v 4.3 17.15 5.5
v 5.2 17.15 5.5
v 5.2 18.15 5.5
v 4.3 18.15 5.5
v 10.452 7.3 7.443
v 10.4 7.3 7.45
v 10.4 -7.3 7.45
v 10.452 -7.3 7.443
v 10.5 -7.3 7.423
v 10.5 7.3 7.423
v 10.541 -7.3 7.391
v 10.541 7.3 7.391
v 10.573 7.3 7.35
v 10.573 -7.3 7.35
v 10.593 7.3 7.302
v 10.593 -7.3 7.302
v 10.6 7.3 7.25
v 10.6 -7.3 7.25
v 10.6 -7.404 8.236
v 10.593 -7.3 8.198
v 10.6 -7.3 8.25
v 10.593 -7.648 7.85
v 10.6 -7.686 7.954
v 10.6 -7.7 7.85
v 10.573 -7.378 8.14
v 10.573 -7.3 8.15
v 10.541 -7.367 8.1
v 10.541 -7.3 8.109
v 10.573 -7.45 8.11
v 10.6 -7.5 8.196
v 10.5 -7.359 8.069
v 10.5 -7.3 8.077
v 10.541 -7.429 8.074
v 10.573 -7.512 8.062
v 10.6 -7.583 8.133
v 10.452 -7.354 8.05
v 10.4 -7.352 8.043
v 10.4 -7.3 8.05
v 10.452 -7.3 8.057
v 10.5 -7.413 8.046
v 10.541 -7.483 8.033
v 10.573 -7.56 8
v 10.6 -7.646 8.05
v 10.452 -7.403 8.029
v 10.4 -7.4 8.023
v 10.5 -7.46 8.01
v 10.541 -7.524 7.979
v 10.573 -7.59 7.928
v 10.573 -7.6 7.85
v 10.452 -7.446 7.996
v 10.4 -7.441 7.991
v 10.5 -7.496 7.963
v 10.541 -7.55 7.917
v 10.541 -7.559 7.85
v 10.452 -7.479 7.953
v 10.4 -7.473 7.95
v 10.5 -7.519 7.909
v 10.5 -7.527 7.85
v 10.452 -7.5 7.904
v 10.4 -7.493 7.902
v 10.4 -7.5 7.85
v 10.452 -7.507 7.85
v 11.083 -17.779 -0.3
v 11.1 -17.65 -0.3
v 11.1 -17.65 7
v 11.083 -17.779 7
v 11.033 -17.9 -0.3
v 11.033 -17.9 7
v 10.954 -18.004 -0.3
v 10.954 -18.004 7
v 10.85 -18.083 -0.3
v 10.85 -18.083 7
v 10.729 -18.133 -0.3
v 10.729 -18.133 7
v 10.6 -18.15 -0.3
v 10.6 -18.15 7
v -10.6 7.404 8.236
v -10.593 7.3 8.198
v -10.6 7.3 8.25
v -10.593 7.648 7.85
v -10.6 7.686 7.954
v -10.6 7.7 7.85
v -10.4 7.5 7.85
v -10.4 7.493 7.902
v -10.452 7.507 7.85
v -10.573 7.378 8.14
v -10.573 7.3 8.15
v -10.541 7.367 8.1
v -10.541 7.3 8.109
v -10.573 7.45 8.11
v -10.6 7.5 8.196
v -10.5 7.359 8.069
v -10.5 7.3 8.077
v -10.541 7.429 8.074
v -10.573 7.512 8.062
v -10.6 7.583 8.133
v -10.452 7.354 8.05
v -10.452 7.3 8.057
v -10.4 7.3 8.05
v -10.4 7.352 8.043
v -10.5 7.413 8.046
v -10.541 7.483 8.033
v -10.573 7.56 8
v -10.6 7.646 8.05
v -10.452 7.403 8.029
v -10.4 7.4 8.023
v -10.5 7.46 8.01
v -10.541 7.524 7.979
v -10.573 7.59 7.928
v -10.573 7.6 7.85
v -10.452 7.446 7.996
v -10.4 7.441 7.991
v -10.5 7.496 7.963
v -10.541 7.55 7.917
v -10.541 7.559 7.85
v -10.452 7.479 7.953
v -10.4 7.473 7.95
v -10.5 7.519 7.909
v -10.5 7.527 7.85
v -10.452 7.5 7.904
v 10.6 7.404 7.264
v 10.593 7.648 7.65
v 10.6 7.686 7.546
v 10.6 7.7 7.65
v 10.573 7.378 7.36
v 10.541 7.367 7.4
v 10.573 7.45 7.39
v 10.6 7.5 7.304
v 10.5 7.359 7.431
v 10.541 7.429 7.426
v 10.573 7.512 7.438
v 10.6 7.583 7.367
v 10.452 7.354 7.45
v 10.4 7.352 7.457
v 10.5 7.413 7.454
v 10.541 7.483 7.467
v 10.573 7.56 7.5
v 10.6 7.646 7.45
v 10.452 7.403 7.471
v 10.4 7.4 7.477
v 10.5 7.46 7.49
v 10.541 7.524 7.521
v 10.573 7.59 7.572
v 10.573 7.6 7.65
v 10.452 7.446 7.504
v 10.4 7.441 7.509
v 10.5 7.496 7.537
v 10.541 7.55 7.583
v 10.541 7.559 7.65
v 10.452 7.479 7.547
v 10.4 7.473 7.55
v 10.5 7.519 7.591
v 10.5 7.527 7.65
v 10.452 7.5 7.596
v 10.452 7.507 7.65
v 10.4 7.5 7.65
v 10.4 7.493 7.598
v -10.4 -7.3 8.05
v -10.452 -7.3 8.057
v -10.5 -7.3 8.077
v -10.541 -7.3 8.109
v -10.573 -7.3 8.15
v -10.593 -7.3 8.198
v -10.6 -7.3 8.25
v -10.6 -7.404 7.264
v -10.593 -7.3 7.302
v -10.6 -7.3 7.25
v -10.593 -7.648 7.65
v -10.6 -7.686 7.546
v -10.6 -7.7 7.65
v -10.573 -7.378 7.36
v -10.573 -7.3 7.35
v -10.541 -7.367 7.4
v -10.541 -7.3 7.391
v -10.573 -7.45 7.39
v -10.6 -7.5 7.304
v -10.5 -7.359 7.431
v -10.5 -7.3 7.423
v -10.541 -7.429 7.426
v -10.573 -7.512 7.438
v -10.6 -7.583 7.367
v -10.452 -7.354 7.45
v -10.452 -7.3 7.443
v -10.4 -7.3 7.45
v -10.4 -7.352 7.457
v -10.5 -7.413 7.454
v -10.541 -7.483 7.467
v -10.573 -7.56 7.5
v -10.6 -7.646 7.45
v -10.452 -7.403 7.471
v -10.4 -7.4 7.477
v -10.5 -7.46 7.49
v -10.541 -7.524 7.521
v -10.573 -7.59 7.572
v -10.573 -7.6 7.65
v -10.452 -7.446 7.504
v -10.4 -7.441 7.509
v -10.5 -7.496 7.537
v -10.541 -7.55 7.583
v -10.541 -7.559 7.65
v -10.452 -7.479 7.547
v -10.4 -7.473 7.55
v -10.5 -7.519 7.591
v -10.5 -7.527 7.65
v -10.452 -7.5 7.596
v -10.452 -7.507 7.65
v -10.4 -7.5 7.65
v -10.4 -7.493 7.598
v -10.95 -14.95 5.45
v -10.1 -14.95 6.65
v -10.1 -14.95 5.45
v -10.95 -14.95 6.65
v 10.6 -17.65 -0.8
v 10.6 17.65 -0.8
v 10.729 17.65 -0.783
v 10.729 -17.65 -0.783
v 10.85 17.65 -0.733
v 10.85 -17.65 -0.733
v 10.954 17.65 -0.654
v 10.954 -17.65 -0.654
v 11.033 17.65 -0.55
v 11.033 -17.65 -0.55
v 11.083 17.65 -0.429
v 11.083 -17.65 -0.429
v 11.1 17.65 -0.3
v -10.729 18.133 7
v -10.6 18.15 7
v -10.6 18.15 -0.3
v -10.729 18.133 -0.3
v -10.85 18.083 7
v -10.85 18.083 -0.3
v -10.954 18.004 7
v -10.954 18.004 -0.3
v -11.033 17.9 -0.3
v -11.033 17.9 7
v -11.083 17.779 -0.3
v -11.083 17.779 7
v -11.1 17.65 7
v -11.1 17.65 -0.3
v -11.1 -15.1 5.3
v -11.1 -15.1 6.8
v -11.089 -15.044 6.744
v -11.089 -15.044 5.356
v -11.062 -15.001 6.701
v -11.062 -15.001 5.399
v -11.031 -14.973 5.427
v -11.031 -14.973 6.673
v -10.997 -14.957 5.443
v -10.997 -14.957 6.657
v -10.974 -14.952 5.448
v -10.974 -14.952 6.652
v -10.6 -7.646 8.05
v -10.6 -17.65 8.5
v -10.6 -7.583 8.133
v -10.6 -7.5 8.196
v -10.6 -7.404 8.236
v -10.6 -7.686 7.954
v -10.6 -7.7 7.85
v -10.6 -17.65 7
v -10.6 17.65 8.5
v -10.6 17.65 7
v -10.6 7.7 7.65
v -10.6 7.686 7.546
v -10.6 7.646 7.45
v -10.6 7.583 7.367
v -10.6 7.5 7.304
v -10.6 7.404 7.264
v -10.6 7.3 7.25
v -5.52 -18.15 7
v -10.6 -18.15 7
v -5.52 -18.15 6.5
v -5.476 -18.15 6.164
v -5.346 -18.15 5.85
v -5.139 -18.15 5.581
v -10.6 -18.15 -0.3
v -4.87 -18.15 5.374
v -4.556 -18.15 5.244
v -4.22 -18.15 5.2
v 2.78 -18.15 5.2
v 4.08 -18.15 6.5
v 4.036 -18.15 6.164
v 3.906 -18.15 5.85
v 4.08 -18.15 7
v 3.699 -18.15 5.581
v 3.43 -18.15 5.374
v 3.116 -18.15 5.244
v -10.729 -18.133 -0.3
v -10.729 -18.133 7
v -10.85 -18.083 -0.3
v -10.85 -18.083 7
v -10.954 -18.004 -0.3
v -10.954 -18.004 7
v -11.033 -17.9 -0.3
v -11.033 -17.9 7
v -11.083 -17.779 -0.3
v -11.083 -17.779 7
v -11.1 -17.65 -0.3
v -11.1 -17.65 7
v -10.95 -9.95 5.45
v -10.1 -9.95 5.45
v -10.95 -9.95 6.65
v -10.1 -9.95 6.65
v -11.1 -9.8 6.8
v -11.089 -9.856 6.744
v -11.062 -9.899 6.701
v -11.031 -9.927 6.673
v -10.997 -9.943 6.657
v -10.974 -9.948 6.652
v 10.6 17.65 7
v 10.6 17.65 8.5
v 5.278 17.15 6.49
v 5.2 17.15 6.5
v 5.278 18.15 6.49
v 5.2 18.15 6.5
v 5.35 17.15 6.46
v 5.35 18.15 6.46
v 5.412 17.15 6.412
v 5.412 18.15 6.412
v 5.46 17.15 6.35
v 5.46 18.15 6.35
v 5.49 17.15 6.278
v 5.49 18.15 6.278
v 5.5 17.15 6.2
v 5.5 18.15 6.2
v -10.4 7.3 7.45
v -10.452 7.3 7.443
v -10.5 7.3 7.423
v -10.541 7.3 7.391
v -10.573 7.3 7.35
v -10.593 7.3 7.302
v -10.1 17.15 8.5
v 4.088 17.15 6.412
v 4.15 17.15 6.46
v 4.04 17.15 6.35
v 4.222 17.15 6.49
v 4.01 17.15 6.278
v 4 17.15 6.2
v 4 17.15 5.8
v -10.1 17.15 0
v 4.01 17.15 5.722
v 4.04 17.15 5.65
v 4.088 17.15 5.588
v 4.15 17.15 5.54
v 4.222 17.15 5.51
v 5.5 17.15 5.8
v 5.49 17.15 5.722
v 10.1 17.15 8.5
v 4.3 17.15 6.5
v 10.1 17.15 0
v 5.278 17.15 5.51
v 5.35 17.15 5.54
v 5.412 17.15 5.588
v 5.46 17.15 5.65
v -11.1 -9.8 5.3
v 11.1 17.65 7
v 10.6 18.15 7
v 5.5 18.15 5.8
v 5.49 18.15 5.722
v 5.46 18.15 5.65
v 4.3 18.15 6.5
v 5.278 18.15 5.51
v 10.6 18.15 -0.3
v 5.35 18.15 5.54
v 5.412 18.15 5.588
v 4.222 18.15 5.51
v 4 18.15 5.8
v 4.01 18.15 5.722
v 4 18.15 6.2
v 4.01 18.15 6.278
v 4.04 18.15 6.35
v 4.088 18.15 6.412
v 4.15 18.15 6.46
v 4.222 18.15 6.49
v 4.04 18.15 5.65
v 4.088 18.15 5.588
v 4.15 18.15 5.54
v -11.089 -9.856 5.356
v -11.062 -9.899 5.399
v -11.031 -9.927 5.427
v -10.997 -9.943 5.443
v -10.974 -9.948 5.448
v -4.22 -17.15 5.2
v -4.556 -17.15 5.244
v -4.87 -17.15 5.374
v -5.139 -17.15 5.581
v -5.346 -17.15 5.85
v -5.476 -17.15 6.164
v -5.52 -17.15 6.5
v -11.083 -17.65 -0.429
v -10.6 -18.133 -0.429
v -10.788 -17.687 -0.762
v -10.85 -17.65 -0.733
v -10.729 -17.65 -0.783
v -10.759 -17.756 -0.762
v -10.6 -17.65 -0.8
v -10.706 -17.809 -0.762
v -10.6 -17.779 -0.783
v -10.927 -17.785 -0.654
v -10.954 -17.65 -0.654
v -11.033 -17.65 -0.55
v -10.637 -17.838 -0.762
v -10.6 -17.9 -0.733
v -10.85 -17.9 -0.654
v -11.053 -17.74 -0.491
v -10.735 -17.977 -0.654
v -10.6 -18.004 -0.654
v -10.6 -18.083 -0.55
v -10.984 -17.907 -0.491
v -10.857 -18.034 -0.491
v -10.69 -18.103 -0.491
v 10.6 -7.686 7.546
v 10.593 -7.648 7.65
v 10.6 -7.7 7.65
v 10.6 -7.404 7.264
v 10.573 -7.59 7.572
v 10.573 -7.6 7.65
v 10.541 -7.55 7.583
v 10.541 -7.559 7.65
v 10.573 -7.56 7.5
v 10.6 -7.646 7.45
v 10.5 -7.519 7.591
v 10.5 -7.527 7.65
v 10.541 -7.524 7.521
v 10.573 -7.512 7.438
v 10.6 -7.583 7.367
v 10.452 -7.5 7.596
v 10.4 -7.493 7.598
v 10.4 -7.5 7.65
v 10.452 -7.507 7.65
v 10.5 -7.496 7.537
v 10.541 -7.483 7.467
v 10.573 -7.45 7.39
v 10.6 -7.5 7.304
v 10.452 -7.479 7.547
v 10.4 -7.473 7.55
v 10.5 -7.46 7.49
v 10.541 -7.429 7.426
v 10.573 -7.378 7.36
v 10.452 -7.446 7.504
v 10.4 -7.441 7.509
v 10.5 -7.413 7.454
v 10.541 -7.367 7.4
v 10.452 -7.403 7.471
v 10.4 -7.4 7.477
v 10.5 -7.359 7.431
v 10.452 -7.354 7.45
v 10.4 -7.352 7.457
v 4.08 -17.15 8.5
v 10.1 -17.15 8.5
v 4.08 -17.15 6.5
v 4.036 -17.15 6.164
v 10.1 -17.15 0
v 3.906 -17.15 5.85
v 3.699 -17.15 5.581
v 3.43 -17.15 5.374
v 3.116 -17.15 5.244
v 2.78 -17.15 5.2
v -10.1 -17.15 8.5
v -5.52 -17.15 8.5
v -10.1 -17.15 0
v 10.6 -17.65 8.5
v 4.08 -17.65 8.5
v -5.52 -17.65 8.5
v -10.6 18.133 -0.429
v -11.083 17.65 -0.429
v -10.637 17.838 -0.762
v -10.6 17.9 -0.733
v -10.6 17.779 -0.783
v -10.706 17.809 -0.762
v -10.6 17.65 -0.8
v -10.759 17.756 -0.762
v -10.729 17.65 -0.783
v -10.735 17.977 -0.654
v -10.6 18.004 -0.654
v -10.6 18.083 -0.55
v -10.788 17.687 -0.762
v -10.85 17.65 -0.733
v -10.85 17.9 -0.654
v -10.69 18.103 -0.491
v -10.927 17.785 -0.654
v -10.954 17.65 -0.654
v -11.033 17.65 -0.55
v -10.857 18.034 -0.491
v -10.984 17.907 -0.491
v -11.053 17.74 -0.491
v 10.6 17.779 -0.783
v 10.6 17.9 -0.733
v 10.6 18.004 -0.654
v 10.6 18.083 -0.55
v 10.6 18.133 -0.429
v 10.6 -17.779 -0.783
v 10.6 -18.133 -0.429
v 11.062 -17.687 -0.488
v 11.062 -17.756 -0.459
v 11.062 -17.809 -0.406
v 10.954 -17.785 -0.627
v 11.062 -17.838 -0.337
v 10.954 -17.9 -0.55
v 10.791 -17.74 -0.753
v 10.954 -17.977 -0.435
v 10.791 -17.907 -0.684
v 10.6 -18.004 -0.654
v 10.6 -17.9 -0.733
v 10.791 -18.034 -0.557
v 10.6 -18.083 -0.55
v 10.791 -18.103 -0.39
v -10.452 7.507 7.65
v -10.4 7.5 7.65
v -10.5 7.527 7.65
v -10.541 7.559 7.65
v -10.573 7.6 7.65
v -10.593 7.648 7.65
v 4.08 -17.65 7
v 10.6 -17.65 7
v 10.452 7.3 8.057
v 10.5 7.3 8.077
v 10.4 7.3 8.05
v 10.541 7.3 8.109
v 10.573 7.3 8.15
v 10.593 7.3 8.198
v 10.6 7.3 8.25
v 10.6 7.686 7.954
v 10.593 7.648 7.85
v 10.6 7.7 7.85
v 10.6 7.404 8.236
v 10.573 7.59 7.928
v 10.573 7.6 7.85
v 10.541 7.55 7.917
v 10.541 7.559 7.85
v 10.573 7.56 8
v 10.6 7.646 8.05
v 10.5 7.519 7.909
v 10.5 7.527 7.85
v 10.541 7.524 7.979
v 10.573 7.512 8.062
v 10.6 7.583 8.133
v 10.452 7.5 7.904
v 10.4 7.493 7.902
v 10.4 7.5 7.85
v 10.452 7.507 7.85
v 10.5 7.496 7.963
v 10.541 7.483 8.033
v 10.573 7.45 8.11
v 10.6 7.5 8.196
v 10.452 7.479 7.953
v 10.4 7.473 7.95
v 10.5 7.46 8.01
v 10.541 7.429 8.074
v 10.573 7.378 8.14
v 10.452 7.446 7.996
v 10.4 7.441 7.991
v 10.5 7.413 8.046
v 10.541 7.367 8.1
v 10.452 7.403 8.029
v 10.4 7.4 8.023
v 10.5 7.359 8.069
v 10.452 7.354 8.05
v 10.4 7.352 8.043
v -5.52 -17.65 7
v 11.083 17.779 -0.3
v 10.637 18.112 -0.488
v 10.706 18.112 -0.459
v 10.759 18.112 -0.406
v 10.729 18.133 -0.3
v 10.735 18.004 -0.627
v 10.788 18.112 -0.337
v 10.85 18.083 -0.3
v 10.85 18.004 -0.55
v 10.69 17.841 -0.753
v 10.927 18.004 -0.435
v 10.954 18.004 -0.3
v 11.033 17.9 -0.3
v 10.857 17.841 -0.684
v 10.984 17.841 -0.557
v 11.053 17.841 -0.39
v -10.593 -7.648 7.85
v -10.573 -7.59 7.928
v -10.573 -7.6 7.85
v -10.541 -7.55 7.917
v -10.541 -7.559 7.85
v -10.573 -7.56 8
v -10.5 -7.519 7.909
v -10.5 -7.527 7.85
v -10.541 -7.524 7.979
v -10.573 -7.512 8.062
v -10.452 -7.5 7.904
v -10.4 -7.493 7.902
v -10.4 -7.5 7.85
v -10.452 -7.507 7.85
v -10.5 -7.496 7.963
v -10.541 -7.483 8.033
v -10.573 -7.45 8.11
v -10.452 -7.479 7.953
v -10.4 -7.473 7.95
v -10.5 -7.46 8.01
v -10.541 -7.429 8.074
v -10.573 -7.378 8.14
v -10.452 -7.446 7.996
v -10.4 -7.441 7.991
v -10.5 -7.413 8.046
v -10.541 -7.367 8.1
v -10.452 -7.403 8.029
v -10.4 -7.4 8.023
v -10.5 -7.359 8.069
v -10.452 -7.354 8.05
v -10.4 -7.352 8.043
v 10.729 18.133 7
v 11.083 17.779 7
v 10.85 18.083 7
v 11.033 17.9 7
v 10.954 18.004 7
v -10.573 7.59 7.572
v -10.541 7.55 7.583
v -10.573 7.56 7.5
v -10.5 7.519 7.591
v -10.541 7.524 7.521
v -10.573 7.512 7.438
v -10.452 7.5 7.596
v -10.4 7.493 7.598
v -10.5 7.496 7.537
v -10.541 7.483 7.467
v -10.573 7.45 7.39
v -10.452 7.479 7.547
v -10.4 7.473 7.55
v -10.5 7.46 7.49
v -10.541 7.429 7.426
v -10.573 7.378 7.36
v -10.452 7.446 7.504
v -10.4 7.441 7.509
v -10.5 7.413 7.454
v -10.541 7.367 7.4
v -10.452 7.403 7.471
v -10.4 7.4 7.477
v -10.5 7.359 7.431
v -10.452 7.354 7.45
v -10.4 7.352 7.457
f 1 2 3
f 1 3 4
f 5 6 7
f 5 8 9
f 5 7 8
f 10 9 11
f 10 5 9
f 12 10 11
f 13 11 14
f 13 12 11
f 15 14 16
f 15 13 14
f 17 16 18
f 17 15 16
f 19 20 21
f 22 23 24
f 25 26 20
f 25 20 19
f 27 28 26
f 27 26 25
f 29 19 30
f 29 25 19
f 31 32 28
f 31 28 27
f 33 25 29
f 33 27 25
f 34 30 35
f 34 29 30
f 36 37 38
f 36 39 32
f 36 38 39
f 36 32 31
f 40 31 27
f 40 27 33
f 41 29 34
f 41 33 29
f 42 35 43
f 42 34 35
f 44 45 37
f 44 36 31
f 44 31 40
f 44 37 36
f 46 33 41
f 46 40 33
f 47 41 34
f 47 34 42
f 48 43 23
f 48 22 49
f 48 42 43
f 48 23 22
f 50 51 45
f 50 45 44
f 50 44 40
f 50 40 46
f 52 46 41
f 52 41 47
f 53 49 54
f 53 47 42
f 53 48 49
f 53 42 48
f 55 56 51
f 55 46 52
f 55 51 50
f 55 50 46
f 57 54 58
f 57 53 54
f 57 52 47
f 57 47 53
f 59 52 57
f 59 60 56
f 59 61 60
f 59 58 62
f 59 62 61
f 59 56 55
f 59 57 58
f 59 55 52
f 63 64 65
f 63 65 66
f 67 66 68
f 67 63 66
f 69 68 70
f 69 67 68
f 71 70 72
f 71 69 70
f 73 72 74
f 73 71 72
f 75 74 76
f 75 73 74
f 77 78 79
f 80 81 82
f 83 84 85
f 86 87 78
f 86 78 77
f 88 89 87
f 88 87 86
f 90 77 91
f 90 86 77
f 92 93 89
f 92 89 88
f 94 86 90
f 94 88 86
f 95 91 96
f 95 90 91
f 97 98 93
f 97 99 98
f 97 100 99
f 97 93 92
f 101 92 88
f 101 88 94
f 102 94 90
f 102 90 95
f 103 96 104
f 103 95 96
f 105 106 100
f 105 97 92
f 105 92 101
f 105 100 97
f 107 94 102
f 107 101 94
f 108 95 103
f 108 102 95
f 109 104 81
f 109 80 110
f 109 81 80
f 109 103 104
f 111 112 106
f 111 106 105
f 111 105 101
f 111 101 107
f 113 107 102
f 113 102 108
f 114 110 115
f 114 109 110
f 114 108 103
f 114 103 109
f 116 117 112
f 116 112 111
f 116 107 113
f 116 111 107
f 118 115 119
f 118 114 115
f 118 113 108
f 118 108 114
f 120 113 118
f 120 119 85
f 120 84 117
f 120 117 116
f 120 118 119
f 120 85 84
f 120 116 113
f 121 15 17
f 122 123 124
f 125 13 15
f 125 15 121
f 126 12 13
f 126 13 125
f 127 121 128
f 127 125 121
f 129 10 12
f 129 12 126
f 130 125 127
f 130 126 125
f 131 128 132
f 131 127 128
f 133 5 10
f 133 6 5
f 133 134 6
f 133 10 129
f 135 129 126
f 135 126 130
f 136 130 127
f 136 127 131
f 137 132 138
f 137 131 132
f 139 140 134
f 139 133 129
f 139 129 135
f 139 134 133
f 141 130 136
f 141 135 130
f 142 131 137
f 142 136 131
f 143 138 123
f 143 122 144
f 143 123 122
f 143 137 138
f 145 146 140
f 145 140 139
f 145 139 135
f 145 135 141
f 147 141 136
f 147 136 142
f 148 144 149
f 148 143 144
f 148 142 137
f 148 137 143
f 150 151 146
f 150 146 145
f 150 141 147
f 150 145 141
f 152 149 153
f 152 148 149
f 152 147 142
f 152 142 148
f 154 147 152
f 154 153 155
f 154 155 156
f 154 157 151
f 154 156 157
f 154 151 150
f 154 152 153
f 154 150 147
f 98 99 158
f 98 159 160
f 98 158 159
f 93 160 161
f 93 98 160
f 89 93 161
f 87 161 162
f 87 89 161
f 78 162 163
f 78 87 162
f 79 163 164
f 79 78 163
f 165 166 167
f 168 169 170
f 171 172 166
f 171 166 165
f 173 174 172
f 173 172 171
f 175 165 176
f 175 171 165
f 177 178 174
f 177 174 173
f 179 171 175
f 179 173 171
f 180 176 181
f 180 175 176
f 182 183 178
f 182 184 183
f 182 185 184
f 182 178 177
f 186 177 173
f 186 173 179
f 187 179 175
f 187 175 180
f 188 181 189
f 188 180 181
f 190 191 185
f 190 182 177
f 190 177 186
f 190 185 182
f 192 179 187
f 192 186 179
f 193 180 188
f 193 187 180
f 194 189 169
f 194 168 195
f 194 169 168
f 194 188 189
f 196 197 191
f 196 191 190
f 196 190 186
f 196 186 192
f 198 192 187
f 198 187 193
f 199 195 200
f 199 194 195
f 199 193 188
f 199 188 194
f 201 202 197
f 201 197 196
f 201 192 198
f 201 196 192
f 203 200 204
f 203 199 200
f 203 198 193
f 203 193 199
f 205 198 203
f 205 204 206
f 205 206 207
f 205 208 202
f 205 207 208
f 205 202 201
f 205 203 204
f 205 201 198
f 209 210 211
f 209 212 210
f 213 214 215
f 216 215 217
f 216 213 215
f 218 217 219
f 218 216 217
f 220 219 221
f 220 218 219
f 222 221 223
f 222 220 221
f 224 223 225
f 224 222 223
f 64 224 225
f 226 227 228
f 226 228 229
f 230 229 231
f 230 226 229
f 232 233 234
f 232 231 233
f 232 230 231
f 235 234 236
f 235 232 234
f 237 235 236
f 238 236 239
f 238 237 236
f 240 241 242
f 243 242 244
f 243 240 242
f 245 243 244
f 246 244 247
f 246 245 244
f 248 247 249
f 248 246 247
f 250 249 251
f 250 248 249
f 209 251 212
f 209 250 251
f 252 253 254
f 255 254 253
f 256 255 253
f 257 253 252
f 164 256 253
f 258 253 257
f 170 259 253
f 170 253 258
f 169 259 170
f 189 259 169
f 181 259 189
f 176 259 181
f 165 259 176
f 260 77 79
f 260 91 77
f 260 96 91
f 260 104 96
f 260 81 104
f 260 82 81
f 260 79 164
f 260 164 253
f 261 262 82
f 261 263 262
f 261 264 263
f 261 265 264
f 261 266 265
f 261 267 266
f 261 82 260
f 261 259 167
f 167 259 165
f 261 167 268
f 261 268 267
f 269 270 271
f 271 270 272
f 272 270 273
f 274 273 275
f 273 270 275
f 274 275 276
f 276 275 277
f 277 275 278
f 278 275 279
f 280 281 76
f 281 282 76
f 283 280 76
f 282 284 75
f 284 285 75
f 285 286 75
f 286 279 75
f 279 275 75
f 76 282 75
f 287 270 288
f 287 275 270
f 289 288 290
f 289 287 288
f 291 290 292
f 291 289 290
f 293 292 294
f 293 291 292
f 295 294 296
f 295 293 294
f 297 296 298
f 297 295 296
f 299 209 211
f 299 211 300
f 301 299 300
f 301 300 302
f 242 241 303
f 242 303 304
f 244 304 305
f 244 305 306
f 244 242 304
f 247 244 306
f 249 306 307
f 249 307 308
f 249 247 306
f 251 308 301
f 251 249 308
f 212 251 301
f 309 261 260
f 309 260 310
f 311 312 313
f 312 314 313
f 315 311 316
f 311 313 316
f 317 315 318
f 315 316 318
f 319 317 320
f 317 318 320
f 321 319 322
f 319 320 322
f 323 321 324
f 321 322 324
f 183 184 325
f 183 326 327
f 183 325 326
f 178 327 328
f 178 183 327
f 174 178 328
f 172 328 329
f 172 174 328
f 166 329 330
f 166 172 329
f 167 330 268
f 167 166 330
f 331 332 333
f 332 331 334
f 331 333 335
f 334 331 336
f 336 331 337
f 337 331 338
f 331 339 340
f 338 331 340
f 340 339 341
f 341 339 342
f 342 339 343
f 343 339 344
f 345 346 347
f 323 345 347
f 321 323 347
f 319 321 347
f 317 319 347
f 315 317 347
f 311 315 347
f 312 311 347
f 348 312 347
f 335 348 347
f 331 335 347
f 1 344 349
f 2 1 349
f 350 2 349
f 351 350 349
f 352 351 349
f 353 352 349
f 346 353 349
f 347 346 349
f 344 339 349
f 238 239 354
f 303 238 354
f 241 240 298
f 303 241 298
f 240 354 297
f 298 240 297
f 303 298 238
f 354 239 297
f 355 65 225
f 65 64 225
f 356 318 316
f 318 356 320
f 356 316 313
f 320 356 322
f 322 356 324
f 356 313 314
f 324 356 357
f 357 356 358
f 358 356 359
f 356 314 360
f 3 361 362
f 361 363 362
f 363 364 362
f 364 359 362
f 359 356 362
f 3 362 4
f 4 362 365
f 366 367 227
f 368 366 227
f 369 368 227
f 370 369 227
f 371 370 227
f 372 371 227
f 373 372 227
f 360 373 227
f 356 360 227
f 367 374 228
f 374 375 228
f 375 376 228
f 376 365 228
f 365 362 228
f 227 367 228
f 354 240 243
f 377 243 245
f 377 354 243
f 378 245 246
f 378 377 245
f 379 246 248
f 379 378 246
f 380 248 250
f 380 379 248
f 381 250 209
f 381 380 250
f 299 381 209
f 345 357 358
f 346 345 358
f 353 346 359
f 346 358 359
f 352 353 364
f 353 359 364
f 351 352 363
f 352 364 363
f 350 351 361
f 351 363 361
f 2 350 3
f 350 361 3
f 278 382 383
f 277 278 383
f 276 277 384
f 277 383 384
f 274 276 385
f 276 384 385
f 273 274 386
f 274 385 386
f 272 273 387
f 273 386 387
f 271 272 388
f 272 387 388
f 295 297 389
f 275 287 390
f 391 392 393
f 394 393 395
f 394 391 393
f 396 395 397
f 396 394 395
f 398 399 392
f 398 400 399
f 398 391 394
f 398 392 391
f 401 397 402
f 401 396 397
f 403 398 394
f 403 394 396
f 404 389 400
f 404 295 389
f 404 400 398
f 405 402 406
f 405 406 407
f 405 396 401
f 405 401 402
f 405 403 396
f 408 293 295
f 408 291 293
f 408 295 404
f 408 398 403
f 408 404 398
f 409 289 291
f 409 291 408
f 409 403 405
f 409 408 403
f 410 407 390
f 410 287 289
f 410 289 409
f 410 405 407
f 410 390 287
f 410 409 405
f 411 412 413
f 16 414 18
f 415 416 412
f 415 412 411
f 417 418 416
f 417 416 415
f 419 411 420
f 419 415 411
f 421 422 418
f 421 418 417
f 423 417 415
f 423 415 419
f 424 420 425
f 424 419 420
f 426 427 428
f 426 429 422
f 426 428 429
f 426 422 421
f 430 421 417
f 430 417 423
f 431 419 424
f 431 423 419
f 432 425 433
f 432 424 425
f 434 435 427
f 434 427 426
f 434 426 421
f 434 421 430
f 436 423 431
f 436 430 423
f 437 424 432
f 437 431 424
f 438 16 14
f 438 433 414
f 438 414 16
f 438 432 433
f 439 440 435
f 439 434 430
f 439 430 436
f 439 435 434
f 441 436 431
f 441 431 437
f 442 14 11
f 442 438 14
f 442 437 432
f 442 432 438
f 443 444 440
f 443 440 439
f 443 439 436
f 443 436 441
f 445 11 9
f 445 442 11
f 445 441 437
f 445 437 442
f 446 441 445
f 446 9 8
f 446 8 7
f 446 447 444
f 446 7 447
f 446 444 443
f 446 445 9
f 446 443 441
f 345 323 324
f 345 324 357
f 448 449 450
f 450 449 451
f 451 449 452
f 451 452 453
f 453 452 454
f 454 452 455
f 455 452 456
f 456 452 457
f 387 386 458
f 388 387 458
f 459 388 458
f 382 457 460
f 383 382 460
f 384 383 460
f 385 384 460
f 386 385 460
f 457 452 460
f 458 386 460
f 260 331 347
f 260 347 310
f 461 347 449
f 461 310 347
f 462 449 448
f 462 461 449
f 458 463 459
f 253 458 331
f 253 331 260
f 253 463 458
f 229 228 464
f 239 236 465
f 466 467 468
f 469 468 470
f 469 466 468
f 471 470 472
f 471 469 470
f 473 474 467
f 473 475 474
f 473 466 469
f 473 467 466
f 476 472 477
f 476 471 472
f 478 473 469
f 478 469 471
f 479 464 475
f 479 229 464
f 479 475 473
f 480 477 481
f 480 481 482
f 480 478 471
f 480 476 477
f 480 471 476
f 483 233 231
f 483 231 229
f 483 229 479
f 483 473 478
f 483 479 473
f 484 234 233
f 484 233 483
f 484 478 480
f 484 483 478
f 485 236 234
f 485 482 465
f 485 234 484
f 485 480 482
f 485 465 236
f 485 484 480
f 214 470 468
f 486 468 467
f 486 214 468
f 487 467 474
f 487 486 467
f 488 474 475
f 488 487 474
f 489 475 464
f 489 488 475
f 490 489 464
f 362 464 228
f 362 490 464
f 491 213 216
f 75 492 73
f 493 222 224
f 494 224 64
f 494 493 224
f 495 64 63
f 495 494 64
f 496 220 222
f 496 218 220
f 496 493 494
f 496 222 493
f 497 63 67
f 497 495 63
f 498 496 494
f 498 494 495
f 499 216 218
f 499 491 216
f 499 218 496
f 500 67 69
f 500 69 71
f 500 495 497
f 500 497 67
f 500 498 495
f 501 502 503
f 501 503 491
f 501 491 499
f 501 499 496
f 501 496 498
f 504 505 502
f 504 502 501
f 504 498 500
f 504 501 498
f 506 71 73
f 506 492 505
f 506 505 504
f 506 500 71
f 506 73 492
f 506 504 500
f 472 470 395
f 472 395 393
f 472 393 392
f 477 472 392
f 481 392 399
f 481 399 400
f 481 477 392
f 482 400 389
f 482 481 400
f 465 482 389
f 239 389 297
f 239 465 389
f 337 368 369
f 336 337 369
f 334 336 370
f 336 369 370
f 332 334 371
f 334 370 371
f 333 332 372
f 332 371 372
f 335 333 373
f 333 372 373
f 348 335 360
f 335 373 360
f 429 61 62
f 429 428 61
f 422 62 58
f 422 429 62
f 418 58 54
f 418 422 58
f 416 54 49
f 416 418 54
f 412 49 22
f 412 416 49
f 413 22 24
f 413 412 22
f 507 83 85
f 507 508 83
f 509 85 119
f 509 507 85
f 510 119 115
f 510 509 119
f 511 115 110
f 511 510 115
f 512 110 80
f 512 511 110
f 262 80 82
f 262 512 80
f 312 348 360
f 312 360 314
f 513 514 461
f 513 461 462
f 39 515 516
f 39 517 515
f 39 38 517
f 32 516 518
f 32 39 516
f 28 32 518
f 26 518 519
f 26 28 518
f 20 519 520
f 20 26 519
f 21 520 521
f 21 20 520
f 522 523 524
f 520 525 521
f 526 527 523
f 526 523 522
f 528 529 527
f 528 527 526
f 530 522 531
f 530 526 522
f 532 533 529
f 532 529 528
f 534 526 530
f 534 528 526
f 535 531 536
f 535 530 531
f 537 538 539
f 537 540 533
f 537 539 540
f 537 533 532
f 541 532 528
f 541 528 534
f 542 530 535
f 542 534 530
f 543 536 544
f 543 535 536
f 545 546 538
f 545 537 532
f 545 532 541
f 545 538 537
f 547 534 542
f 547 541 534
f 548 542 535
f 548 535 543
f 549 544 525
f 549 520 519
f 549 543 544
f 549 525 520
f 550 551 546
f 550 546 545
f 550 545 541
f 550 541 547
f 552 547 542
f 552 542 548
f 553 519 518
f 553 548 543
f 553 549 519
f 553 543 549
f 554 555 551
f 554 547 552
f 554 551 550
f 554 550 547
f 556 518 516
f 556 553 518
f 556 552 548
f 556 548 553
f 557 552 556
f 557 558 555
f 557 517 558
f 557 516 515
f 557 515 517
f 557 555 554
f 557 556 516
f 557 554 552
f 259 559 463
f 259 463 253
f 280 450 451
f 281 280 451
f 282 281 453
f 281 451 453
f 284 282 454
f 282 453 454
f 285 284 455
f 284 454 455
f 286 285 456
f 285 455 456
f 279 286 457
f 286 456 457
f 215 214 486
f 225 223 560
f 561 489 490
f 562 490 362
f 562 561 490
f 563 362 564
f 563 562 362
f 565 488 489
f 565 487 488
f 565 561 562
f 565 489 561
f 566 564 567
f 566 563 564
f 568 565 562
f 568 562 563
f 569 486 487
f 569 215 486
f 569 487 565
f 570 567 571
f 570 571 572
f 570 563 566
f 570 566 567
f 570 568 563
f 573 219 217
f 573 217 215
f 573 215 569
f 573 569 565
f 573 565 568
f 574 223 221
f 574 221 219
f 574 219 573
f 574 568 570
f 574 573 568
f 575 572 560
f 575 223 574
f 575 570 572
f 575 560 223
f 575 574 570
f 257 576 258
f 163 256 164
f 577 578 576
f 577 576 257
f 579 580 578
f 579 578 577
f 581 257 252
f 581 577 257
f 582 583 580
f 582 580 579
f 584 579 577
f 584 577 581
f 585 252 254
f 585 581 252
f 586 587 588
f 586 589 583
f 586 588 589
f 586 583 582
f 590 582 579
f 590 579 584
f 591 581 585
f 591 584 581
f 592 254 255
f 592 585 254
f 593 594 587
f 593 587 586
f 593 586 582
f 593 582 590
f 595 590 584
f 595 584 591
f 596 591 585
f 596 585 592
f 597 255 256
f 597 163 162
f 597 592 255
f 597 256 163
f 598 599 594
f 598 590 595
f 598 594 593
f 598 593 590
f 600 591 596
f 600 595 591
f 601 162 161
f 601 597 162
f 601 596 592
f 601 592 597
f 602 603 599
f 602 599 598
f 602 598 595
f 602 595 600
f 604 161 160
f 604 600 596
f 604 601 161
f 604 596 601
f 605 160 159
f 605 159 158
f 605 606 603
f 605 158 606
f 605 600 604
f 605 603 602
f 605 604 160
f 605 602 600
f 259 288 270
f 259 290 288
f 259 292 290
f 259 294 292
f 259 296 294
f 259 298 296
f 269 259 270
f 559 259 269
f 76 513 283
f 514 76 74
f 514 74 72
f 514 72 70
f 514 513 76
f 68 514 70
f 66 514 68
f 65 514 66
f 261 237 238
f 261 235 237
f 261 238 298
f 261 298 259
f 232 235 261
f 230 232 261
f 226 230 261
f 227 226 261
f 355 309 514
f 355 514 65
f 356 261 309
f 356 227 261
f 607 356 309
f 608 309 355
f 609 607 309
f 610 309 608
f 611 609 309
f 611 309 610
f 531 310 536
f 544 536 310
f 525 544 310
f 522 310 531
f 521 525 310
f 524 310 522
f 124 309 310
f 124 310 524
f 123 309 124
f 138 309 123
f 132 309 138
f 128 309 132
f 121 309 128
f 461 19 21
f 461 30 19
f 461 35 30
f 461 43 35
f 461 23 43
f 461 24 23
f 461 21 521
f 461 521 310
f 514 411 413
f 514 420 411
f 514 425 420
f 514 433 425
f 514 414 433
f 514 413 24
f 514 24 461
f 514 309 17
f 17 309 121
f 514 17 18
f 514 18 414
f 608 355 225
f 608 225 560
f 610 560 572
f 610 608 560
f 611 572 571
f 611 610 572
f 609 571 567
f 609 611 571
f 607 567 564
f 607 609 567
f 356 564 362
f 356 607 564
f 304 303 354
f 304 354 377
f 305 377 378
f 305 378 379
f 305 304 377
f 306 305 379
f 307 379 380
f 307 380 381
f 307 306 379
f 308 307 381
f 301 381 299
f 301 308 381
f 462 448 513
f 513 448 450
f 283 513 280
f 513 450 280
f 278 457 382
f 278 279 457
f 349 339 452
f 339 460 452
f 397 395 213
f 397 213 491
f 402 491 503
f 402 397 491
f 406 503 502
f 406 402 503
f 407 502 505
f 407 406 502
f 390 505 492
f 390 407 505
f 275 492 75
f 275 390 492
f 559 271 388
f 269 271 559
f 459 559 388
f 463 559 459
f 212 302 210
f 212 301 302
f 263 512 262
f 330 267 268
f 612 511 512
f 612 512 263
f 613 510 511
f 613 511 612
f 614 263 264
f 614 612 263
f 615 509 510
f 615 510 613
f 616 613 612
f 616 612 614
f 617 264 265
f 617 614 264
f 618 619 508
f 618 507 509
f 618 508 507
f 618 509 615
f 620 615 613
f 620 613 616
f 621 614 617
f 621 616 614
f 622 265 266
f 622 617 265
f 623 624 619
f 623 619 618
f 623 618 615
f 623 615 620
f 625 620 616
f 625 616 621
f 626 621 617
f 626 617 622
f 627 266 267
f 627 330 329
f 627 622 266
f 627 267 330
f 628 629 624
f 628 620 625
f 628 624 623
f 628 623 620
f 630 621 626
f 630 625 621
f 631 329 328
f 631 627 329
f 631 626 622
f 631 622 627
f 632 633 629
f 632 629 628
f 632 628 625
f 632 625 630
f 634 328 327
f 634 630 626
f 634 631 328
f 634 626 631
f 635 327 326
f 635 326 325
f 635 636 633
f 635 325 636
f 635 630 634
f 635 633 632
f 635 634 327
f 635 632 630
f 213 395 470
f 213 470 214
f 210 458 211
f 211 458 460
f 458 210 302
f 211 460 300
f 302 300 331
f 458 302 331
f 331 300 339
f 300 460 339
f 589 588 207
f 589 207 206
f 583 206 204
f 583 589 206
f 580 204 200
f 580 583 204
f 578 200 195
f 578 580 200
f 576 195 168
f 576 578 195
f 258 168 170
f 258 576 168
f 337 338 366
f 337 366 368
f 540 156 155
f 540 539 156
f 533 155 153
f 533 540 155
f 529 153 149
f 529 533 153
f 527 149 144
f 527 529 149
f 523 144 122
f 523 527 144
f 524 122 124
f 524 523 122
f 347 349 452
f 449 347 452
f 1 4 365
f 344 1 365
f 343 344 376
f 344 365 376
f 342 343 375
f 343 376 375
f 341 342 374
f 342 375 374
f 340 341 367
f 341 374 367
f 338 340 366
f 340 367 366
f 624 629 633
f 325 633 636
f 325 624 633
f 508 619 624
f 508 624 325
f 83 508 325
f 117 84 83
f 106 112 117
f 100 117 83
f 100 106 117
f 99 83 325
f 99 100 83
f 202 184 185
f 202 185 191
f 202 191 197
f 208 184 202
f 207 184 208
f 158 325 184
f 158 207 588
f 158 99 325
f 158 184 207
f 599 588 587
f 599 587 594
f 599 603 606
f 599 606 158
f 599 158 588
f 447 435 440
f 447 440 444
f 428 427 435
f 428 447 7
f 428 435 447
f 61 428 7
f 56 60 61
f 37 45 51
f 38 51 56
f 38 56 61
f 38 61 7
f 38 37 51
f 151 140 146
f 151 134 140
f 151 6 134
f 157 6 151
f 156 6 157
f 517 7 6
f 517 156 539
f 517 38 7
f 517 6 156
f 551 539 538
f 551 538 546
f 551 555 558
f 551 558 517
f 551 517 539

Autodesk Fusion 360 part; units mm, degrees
sketch "Sketch1" plane through (0, 0, 0) normal (0, 0, 1) x (1, 0, 0)
  line L0 (10.1, -17.15) -> (-10.1, -17.15)
  line L1 (-10.1, -17.15) -> (-10.1, 17.15)
  line L2 (-10.1, 17.15) -> (10.1, 17.15)
  line L3 (10.1, 17.15) -> (10.1, -17.15)
  line L4 (10.1, -17.15) -> (-10.1, 17.15) construction
  line L5 (-10.1, -17.15) -> (10.1, 17.15) construction
  line L6 (11.1, 18.15) -> (-11.1, 18.15)
  line L7 (-11.1, 18.15) -> (-11.1, -18.15)
  line L8 (-11.1, -18.15) -> (11.1, -18.15)
  line L9 (11.1, -18.15) -> (11.1, 18.15)
  line L10 (11.1, 18.15) -> (-11.1, -18.15) construction
  line L11 (-11.1, 18.15) -> (11.1, -18.15) construction
  dimension "d1" = 20.2
  dimension "d2" = 34.3
  dimension "d4" = 1
  dimension "d5" = 1
extrude "Extrude1" add sketch "Sketch1" along normal blind 7
sketch "Sketch2" plane through (0, 0, 0) normal (0, 0, -1) x (1, 0, 0)
  line L0 (10.1, -17.15) -> (-10.1, -17.15)
  line L1 (-10.1, -17.15) -> (-10.1, 17.15)
  line L2 (-10.1, 17.15) -> (10.1, 17.15)
  line L3 (10.1, 17.15) -> (10.1, -17.15)
  line L4 (11.1, -18.15) -> (11.1, 18.15)
  line L5 (11.1, 18.15) -> (-11.1, 18.15)
  line L6 (-11.1, 18.15) -> (-11.1, -18.15)
  line L7 (-11.1, -18.15) -> (11.1, -18.15)
  line L8 (-11.1, 18.15) -> (11.1, 18.15)
  line L9 (11.1, 18.15) -> (11.1, -18.15)
  line L10 (11.1, -18.15) -> (-11.1, -18.15)
  line L11 (-11.1, -18.15) -> (-11.1, 18.15)
extrude "Extrude2" add sketch "Sketch2" along normal blind 0.8 contours L0 L1 L2 L3 | L4 L5 L6 L7 L8 L9 L10 L11
sketch "Sketch3" plane through (0, -18.15, 0) normal (0, -1, 0) x (1, 0, 0)
  line L0 (11.1, -0.8) -> (11.1, 7)
  line L1 (11.1, 7) -> (-11.1, 7)
  line L2 (-11.1, 7) -> (-11.1, -0.8)
  line L3 (-11.1, -0.8) -> (11.1, -0.8)
  line L4 (-5.52, 7) -> (4.08, 7)
  line L5 (4.08, 7) -> (4.08, 5.2)
  line L6 (4.08, 5.2) -> (-5.52, 5.2)
  line L7 (-5.52, 5.2) -> (-5.52, 7)
  dimension "d10" = 6
  dimension "d11" = 5.58
  dimension "d14" = 9.6
extrude "Extrude3" cut sketch "Sketch3" against normal up to surface (1 mm away) contours L1 L4 L5 L6 L7
fillet "Fillet1" radius 1.3 2 edges at (-5.52, -17.65, 5.2) (4.08, -17.65, 5.2)
sketch "Sketch4" plane through (-11.1, 0, 0) normal (-1, 0, 0) x (0, -1, 0)
  line L0 (18.15, -0.8) -> (18.15, 7)
  line L1 (18.15, 7) -> (-18.15, 7)
  line L2 (-18.15, 7) -> (-18.15, -0.8)
  line L3 (-18.15, -0.8) -> (18.15, -0.8)
  line L4 (9.95, 6.65) -> (14.95, 6.65)
  line L5 (14.95, 6.65) -> (14.95, 5.45)
  line L6 (14.95, 5.45) -> (9.95, 5.45)
  line L7 (9.95, 5.45) -> (9.95, 6.65)
  dimension "d17" = 3.2
  dimension "d18" = 5
  dimension "d19" = 1.2
  dimension "d22" = 0.35
extrude "Extrude4" cut sketch "Sketch4" against normal up to surface (1 mm away) contours L4 L5 L6 L7
fillet "Fillet2" radius 0.15 4 edges at (-11.1, -12.45, 5.45) (-11.1, -9.95, 6.05) (-11.1, -12.45, 6.65) (-11.1, -14.95, 6.05)
sketch "Sketch5" plane through (0, 0, 7) normal (0, 0, 1) x (-1, 0, 0)
  line L0 (-4.08, 17.15) -> (-4.08, 18.15)
  line L1 (-4.08, 18.15) -> (-11.1, 18.15)
  line L2 (-11.1, 18.15) -> (-11.1, -18.15)
  line L3 (-11.1, -18.15) -> (11.1, -18.15)
  line L4 (11.1, -18.15) -> (11.1, 18.15)
  line L5 (11.1, 18.15) -> (5.52, 18.15)
  line L6 (5.52, 18.15) -> (5.52, 17.15)
  line L7 (5.52, 17.15) -> (10.1, 17.15)
  line L8 (10.1, 17.15) -> (10.1, -17.15)
  line L9 (10.1, -17.15) -> (-10.1, -17.15)
  line L10 (-10.1, -17.15) -> (-10.1, 17.15)
  line L11 (-10.1, 17.15) -> (-4.08, 17.15)
  line L12 (10.6, -17.65) -> (-10.6, -17.65)
  line L13 (-10.6, -17.65) -> (-10.6, 17.65)
  line L14 (-10.6, 17.65) -> (10.6, 17.65)
  line L15 (10.6, 17.65) -> (10.6, -17.65)
  dimension "d26" = 0.5
  dimension "d27" = 0.5
  dimension "d28" = 0.5
  dimension "d29" = 0.5
extrude "Extrude5" add sketch "Sketch5" along normal blind 1.5 contours L0 L6 L7 L8 L9 L10 L11 L12 L13 L14 L15
sketch "Sketch7" plane through (10.6, 0, 0) normal (1, 0, 0) x (0, 1, 0)
  line L0 (-17.65, 7) -> (17.65, 7)
  line L1 (17.65, 7) -> (17.65, 8.5)
  line L2 (17.65, 8.5) -> (-17.65, 8.5)
  line L3 (-17.65, 8.5) -> (-17.65, 7)
  line L4 (-17.65, 8.5) -> (17.65, 7) construction
  line L5 (17.65, 8.5) -> (-17.65, 7) construction
  line L6 (0, 7.75) -> (-14.5, 7.75) construction
  line L7 (7.5, 7.45) -> (-7.5, 7.45)
  line L8 (-7.5, 7.45) -> (-7.5, 8.05)
  line L9 (-7.5, 8.05) -> (7.5, 8.05)
  line L10 (7.5, 8.05) -> (7.5, 7.45)
  line L11 (7.5, 7.45) -> (-7.5, 8.05) construction
  line L12 (-7.5, 7.45) -> (7.5, 8.05) construction
  point P0 (0, 7.75)
  dimension "d32" = 15
  dimension "d33" = 0.6
ref_plane "WorkPlane1" through (0, 0, 7.75) normal (1, 0, 0) x (0, 1, 0)
extrude "Extrude6" cut sketch "Sketch7" against normal blind 0.2 contours L7 L8 L9 L10
fillet "Fillet5" radius 0.2 4 edges at (10.5, -7.5, 7.45) (10.5, -7.5, 8.05) (10.5, 7.5, 7.45) (10.5, 7.5, 8.05)
fillet "Fillet6" radius 0.2 8 edges at (10.6, -7.4414, 7.5086) (10.6, 0, 7.45) (10.6, 7.4414, 7.5086) (10.6, 7.5, 7.75) (10.6, 7.4414, 7.9914) (10.6, 0, 8.05) (10.6, -7.4414, 7.9914) (10.6, -7.5, 7.75)
mirror "Mirror2" about plane through (0, 0, 7.75) normal (1, 0, 0) of "Extrude6"
fillet "Fillet7" radius 0.2 4 edges at (-10.5, 7.5, 7.45) (-10.5, 7.5, 8.05) (-10.5, -7.5, 7.45) (-10.5, -7.5, 8.05)
fillet "Fillet8" radius 0.2 8 edges at (-10.6, -7.4414, 7.9914) (-10.6, -7.5, 7.75) (-10.6, -7.4414, 7.5086) (-10.6, 0, 7.45) (-10.6, 7.4414, 7.5086) (-10.6, 7.5, 7.75) (-10.6, 7.4414, 7.9914) (-10.6, 0, 8.05)
fillet "Fillet9" radius 0.5 8 edges at (-11.1, 18.15, 3.1) (-11.1, -18.15, 3.1) (-11.1, 0, -0.8) (0, -18.15, -0.8) (11.1, -18.15, 3.1) (11.1, 0, -0.8) (11.1, 18.15, 3.1) (0, 18.15, -0.8)
sketch "Sketch8" plane through (0, 17.15, 0) normal (0, -1, 0) x (1, 0, 0)
  line L0 (-10.1, 0) -> (10.1, 0)
  line L1 (10.1, 0) -> (10.1, 8.5)
  line L2 (10.1, 8.5) -> (-10.1, 8.5)
  line L3 (-10.1, 8.5) -> (-10.1, 0)
  line L4 (4, 6.5) -> (5.5, 6.5)
  line L5 (5.5, 6.5) -> (5.5, 5.5)
  line L6 (5.5, 5.5) -> (4, 5.5)
  line L7 (4, 5.5) -> (4, 6.5)
  dimension "d55" = 4.6
  dimension "d56" = 2
  dimension "d57" = 1.5
  dimension "d58" = 1
extrude "Extrude7" cut sketch "Sketch8" against normal up to surface (1 mm away) contours L4 L5 L6 L7
fillet "Fillet10" radius 0.3 4 edges at (5.5, 17.65, 5.5) (5.5, 17.65, 6.5) (4, 17.65, 6.5) (4, 17.65, 5.5)
equation "case_thickness = 1 mm"
equation "d4 = case_thickness"
equation "d5 = case_thickness"
equation "d8 = case_bottom - 0.2 mm"
equation "d11 = 4.58 mm + case_thickness"
equation "lock_rim = 0.5 mm"
equation "d26 = lock_rim"
equation "d27 = lock_rim"
equation "d28 = lock_rim"
equation "d29 = lock_rim"
equation "d43 = clip_roundness"
equation "d45 = clip_roundness"
equation "clip_roundness = 0.2 mm"
equation "d50 = clip_roundness"
equation "d52 = clip_roundness"
equation "case_bottom = 1 mm"
